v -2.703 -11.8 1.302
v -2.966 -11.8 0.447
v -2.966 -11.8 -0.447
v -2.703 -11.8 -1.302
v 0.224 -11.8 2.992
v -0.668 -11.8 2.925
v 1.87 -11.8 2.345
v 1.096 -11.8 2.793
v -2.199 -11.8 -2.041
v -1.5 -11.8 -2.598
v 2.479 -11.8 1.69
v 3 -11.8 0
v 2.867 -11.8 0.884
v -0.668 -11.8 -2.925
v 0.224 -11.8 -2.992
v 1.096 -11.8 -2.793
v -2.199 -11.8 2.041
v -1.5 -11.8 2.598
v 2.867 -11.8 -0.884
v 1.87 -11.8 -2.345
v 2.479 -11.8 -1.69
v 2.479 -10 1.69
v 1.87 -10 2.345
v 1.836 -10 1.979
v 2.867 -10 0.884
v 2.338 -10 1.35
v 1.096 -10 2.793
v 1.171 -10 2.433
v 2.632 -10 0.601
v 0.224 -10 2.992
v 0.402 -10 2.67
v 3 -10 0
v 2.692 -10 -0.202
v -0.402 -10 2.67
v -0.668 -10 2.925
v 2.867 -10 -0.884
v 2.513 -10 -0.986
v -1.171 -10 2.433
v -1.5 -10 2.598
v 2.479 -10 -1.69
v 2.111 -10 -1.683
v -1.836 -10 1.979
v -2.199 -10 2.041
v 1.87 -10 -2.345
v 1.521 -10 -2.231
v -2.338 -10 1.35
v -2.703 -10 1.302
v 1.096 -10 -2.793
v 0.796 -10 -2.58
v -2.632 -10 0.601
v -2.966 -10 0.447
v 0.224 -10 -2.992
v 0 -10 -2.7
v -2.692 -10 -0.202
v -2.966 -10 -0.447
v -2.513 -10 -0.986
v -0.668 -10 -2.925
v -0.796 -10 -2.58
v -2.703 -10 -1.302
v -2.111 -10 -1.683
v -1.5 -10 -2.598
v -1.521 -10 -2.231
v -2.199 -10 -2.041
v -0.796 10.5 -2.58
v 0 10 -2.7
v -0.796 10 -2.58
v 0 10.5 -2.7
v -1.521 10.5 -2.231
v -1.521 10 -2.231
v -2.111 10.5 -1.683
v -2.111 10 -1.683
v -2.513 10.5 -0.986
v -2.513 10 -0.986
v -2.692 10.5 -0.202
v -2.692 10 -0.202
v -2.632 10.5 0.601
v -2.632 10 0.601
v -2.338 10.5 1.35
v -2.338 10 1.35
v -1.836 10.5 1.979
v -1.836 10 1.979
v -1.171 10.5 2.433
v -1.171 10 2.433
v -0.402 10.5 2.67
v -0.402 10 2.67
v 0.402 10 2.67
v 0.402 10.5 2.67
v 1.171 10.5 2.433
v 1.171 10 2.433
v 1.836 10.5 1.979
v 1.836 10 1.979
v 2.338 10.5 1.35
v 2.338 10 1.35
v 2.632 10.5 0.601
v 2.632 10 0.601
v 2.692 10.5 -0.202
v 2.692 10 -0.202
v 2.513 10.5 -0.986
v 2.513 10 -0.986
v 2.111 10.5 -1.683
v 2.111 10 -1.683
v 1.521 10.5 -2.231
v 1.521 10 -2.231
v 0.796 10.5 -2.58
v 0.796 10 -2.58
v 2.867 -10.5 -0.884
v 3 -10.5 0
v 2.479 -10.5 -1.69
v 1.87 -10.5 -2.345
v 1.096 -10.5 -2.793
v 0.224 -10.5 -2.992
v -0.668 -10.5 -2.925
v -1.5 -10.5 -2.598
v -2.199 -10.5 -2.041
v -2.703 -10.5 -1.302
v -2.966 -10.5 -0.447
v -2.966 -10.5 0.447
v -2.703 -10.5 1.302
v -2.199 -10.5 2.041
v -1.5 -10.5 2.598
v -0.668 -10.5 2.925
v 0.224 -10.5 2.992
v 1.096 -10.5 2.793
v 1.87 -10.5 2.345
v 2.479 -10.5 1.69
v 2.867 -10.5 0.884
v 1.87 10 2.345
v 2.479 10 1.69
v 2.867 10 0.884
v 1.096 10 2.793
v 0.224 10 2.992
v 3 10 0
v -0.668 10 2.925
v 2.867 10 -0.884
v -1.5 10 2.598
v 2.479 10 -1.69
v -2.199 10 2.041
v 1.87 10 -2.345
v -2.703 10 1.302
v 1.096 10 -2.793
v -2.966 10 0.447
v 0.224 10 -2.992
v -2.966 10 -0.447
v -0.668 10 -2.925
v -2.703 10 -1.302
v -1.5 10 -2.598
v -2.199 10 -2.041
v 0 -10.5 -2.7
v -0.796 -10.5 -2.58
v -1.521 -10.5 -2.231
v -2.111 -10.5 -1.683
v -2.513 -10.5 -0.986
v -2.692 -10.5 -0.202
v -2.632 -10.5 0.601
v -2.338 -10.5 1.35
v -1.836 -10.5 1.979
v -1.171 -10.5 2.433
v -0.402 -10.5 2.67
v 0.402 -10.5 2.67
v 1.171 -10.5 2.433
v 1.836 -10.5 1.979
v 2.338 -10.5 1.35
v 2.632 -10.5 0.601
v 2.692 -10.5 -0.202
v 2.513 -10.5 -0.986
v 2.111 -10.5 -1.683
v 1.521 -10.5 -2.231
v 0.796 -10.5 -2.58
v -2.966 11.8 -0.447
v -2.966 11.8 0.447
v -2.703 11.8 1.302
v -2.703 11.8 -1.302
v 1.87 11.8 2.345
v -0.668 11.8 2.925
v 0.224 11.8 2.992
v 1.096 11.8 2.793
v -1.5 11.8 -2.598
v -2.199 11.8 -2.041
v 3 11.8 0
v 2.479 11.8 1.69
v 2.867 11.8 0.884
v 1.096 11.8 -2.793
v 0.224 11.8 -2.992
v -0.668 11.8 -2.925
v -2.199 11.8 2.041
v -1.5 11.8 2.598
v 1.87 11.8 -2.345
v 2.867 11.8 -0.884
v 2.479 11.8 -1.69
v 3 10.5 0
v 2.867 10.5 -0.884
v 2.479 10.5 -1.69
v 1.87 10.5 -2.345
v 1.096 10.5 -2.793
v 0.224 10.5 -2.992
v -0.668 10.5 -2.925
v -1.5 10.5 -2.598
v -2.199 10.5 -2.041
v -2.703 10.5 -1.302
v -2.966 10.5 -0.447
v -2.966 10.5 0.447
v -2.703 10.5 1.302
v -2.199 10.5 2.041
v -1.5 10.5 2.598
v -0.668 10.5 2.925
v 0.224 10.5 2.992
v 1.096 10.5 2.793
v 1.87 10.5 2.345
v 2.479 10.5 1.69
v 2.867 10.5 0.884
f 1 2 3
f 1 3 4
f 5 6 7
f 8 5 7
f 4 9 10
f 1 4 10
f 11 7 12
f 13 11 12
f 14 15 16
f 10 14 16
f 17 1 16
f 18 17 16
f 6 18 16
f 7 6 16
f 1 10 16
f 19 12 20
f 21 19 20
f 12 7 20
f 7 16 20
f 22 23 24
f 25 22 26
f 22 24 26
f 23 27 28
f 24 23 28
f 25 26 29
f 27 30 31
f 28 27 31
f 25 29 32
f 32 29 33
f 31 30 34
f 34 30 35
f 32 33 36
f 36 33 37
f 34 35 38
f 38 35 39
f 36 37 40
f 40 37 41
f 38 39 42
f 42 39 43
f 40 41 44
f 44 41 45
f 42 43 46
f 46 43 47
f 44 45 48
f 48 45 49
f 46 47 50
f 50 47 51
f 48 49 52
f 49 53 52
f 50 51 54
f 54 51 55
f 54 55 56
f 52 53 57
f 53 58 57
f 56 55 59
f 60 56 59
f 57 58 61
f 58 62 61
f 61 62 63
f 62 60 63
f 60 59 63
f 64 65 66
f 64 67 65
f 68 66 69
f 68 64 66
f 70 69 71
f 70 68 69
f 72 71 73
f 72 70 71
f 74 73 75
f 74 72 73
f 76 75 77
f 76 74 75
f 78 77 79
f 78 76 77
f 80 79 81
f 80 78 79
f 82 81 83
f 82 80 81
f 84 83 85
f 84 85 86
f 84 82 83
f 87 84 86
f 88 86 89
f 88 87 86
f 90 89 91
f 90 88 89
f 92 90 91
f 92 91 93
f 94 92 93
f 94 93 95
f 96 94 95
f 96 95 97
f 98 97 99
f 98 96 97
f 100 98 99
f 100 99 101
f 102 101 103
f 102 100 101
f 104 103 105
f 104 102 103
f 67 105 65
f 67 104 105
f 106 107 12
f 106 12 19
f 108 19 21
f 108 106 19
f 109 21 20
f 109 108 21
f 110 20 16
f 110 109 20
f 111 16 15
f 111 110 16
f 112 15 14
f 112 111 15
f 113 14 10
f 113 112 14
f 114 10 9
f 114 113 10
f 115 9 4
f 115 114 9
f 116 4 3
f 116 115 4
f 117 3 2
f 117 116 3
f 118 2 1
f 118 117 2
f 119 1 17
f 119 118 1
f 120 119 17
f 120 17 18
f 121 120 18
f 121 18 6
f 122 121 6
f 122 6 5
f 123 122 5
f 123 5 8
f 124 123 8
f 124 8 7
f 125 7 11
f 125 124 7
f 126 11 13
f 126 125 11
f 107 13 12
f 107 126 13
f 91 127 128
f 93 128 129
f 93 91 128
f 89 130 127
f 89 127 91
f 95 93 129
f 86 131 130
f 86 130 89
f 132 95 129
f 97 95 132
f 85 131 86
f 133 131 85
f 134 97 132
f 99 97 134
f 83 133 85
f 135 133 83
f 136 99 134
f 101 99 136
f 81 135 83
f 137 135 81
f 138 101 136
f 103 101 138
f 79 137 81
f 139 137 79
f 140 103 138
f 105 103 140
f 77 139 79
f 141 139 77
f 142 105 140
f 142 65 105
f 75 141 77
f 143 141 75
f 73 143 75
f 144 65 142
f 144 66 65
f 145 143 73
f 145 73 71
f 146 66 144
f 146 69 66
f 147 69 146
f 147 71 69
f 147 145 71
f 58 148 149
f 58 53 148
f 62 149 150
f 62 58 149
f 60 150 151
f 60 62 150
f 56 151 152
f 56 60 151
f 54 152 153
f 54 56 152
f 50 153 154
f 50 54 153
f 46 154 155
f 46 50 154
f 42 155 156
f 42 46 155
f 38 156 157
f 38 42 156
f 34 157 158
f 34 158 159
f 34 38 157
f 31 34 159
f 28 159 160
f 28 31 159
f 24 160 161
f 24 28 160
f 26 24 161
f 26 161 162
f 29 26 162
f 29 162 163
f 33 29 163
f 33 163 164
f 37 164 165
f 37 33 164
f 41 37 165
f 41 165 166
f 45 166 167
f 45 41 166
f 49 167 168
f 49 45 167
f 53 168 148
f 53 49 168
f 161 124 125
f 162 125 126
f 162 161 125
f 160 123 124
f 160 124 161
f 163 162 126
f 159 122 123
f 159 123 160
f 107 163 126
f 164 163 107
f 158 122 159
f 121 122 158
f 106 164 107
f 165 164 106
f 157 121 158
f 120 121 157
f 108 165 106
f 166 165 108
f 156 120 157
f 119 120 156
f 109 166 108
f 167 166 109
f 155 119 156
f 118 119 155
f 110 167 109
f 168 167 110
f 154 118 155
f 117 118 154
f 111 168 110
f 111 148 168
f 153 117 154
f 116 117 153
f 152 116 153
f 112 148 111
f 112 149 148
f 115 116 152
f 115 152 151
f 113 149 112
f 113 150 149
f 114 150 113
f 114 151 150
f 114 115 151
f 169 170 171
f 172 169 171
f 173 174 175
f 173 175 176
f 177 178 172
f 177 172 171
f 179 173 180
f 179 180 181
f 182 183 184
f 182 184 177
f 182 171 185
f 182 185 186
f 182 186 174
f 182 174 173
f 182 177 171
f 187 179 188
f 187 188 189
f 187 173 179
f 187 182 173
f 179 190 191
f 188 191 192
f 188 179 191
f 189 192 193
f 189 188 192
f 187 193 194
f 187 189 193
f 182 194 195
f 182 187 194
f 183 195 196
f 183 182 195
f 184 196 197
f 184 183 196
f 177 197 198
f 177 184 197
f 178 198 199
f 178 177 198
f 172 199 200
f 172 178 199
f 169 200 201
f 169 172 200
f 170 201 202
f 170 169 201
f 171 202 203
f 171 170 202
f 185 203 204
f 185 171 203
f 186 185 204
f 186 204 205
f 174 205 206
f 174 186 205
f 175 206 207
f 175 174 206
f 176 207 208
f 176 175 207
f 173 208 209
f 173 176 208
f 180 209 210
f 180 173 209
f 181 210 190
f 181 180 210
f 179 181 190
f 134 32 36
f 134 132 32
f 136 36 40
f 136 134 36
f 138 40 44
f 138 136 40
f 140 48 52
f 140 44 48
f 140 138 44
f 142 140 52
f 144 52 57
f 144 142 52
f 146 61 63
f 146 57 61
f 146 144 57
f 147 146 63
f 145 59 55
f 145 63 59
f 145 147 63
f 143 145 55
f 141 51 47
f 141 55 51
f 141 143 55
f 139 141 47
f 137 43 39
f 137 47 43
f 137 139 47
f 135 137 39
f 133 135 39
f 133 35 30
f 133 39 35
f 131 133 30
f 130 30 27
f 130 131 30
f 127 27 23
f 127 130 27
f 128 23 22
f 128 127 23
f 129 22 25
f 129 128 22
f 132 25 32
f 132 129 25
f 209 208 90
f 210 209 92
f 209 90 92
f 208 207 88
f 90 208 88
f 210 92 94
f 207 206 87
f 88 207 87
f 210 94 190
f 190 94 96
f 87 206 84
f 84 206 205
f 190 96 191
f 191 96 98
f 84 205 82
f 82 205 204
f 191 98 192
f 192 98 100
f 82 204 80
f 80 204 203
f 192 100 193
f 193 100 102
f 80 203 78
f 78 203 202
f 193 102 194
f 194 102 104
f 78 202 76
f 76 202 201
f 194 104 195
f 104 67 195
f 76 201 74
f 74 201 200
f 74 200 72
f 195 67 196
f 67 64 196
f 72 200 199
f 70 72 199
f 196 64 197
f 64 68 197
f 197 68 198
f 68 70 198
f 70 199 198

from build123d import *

# Parameters (mm, degrees)
ESBO_O1_W = 3
ESBO_O1_H = 23.6
ESBO_O2_W = 0.3
ESBO_O2_H = 0.5


with BuildPart() as part:
    # Esboço1 → Revolução1 (revolve)
    with BuildSketch(Plane.XY, mode=Mode.PRIVATE) as revolu_o1_sk:
        with Locations((-1.5, 0)):
            Rectangle(ESBO_O1_W, ESBO_O1_H)
    revolve(revolu_o1_sk.sketch.rotate(Axis((0, -11.8, 0), (0, 1, 0)), 180), axis=Axis((0, -11.8, 0), (0, 1, 0)))

    # Esboço2 → Corte-Revolução3 (revolve, cut)
    with BuildSketch(Plane.XY, mode=Mode.PRIVATE) as corte_revolu_o3_sk:
        with Locations((-2.85, -10.25)):
            Rectangle(ESBO_O2_W, ESBO_O2_H)
        with Locations((-2.85, 10.25)):
            Rectangle(ESBO_O2_W, ESBO_O2_H)
    revolve(corte_revolu_o3_sk.sketch.rotate(Axis((0, 0, 0), (0, 1, 0)), 270), axis=Axis((0, 0, 0), (0, 1, 0)), mode=Mode.SUBTRACT)


solid = part.part
